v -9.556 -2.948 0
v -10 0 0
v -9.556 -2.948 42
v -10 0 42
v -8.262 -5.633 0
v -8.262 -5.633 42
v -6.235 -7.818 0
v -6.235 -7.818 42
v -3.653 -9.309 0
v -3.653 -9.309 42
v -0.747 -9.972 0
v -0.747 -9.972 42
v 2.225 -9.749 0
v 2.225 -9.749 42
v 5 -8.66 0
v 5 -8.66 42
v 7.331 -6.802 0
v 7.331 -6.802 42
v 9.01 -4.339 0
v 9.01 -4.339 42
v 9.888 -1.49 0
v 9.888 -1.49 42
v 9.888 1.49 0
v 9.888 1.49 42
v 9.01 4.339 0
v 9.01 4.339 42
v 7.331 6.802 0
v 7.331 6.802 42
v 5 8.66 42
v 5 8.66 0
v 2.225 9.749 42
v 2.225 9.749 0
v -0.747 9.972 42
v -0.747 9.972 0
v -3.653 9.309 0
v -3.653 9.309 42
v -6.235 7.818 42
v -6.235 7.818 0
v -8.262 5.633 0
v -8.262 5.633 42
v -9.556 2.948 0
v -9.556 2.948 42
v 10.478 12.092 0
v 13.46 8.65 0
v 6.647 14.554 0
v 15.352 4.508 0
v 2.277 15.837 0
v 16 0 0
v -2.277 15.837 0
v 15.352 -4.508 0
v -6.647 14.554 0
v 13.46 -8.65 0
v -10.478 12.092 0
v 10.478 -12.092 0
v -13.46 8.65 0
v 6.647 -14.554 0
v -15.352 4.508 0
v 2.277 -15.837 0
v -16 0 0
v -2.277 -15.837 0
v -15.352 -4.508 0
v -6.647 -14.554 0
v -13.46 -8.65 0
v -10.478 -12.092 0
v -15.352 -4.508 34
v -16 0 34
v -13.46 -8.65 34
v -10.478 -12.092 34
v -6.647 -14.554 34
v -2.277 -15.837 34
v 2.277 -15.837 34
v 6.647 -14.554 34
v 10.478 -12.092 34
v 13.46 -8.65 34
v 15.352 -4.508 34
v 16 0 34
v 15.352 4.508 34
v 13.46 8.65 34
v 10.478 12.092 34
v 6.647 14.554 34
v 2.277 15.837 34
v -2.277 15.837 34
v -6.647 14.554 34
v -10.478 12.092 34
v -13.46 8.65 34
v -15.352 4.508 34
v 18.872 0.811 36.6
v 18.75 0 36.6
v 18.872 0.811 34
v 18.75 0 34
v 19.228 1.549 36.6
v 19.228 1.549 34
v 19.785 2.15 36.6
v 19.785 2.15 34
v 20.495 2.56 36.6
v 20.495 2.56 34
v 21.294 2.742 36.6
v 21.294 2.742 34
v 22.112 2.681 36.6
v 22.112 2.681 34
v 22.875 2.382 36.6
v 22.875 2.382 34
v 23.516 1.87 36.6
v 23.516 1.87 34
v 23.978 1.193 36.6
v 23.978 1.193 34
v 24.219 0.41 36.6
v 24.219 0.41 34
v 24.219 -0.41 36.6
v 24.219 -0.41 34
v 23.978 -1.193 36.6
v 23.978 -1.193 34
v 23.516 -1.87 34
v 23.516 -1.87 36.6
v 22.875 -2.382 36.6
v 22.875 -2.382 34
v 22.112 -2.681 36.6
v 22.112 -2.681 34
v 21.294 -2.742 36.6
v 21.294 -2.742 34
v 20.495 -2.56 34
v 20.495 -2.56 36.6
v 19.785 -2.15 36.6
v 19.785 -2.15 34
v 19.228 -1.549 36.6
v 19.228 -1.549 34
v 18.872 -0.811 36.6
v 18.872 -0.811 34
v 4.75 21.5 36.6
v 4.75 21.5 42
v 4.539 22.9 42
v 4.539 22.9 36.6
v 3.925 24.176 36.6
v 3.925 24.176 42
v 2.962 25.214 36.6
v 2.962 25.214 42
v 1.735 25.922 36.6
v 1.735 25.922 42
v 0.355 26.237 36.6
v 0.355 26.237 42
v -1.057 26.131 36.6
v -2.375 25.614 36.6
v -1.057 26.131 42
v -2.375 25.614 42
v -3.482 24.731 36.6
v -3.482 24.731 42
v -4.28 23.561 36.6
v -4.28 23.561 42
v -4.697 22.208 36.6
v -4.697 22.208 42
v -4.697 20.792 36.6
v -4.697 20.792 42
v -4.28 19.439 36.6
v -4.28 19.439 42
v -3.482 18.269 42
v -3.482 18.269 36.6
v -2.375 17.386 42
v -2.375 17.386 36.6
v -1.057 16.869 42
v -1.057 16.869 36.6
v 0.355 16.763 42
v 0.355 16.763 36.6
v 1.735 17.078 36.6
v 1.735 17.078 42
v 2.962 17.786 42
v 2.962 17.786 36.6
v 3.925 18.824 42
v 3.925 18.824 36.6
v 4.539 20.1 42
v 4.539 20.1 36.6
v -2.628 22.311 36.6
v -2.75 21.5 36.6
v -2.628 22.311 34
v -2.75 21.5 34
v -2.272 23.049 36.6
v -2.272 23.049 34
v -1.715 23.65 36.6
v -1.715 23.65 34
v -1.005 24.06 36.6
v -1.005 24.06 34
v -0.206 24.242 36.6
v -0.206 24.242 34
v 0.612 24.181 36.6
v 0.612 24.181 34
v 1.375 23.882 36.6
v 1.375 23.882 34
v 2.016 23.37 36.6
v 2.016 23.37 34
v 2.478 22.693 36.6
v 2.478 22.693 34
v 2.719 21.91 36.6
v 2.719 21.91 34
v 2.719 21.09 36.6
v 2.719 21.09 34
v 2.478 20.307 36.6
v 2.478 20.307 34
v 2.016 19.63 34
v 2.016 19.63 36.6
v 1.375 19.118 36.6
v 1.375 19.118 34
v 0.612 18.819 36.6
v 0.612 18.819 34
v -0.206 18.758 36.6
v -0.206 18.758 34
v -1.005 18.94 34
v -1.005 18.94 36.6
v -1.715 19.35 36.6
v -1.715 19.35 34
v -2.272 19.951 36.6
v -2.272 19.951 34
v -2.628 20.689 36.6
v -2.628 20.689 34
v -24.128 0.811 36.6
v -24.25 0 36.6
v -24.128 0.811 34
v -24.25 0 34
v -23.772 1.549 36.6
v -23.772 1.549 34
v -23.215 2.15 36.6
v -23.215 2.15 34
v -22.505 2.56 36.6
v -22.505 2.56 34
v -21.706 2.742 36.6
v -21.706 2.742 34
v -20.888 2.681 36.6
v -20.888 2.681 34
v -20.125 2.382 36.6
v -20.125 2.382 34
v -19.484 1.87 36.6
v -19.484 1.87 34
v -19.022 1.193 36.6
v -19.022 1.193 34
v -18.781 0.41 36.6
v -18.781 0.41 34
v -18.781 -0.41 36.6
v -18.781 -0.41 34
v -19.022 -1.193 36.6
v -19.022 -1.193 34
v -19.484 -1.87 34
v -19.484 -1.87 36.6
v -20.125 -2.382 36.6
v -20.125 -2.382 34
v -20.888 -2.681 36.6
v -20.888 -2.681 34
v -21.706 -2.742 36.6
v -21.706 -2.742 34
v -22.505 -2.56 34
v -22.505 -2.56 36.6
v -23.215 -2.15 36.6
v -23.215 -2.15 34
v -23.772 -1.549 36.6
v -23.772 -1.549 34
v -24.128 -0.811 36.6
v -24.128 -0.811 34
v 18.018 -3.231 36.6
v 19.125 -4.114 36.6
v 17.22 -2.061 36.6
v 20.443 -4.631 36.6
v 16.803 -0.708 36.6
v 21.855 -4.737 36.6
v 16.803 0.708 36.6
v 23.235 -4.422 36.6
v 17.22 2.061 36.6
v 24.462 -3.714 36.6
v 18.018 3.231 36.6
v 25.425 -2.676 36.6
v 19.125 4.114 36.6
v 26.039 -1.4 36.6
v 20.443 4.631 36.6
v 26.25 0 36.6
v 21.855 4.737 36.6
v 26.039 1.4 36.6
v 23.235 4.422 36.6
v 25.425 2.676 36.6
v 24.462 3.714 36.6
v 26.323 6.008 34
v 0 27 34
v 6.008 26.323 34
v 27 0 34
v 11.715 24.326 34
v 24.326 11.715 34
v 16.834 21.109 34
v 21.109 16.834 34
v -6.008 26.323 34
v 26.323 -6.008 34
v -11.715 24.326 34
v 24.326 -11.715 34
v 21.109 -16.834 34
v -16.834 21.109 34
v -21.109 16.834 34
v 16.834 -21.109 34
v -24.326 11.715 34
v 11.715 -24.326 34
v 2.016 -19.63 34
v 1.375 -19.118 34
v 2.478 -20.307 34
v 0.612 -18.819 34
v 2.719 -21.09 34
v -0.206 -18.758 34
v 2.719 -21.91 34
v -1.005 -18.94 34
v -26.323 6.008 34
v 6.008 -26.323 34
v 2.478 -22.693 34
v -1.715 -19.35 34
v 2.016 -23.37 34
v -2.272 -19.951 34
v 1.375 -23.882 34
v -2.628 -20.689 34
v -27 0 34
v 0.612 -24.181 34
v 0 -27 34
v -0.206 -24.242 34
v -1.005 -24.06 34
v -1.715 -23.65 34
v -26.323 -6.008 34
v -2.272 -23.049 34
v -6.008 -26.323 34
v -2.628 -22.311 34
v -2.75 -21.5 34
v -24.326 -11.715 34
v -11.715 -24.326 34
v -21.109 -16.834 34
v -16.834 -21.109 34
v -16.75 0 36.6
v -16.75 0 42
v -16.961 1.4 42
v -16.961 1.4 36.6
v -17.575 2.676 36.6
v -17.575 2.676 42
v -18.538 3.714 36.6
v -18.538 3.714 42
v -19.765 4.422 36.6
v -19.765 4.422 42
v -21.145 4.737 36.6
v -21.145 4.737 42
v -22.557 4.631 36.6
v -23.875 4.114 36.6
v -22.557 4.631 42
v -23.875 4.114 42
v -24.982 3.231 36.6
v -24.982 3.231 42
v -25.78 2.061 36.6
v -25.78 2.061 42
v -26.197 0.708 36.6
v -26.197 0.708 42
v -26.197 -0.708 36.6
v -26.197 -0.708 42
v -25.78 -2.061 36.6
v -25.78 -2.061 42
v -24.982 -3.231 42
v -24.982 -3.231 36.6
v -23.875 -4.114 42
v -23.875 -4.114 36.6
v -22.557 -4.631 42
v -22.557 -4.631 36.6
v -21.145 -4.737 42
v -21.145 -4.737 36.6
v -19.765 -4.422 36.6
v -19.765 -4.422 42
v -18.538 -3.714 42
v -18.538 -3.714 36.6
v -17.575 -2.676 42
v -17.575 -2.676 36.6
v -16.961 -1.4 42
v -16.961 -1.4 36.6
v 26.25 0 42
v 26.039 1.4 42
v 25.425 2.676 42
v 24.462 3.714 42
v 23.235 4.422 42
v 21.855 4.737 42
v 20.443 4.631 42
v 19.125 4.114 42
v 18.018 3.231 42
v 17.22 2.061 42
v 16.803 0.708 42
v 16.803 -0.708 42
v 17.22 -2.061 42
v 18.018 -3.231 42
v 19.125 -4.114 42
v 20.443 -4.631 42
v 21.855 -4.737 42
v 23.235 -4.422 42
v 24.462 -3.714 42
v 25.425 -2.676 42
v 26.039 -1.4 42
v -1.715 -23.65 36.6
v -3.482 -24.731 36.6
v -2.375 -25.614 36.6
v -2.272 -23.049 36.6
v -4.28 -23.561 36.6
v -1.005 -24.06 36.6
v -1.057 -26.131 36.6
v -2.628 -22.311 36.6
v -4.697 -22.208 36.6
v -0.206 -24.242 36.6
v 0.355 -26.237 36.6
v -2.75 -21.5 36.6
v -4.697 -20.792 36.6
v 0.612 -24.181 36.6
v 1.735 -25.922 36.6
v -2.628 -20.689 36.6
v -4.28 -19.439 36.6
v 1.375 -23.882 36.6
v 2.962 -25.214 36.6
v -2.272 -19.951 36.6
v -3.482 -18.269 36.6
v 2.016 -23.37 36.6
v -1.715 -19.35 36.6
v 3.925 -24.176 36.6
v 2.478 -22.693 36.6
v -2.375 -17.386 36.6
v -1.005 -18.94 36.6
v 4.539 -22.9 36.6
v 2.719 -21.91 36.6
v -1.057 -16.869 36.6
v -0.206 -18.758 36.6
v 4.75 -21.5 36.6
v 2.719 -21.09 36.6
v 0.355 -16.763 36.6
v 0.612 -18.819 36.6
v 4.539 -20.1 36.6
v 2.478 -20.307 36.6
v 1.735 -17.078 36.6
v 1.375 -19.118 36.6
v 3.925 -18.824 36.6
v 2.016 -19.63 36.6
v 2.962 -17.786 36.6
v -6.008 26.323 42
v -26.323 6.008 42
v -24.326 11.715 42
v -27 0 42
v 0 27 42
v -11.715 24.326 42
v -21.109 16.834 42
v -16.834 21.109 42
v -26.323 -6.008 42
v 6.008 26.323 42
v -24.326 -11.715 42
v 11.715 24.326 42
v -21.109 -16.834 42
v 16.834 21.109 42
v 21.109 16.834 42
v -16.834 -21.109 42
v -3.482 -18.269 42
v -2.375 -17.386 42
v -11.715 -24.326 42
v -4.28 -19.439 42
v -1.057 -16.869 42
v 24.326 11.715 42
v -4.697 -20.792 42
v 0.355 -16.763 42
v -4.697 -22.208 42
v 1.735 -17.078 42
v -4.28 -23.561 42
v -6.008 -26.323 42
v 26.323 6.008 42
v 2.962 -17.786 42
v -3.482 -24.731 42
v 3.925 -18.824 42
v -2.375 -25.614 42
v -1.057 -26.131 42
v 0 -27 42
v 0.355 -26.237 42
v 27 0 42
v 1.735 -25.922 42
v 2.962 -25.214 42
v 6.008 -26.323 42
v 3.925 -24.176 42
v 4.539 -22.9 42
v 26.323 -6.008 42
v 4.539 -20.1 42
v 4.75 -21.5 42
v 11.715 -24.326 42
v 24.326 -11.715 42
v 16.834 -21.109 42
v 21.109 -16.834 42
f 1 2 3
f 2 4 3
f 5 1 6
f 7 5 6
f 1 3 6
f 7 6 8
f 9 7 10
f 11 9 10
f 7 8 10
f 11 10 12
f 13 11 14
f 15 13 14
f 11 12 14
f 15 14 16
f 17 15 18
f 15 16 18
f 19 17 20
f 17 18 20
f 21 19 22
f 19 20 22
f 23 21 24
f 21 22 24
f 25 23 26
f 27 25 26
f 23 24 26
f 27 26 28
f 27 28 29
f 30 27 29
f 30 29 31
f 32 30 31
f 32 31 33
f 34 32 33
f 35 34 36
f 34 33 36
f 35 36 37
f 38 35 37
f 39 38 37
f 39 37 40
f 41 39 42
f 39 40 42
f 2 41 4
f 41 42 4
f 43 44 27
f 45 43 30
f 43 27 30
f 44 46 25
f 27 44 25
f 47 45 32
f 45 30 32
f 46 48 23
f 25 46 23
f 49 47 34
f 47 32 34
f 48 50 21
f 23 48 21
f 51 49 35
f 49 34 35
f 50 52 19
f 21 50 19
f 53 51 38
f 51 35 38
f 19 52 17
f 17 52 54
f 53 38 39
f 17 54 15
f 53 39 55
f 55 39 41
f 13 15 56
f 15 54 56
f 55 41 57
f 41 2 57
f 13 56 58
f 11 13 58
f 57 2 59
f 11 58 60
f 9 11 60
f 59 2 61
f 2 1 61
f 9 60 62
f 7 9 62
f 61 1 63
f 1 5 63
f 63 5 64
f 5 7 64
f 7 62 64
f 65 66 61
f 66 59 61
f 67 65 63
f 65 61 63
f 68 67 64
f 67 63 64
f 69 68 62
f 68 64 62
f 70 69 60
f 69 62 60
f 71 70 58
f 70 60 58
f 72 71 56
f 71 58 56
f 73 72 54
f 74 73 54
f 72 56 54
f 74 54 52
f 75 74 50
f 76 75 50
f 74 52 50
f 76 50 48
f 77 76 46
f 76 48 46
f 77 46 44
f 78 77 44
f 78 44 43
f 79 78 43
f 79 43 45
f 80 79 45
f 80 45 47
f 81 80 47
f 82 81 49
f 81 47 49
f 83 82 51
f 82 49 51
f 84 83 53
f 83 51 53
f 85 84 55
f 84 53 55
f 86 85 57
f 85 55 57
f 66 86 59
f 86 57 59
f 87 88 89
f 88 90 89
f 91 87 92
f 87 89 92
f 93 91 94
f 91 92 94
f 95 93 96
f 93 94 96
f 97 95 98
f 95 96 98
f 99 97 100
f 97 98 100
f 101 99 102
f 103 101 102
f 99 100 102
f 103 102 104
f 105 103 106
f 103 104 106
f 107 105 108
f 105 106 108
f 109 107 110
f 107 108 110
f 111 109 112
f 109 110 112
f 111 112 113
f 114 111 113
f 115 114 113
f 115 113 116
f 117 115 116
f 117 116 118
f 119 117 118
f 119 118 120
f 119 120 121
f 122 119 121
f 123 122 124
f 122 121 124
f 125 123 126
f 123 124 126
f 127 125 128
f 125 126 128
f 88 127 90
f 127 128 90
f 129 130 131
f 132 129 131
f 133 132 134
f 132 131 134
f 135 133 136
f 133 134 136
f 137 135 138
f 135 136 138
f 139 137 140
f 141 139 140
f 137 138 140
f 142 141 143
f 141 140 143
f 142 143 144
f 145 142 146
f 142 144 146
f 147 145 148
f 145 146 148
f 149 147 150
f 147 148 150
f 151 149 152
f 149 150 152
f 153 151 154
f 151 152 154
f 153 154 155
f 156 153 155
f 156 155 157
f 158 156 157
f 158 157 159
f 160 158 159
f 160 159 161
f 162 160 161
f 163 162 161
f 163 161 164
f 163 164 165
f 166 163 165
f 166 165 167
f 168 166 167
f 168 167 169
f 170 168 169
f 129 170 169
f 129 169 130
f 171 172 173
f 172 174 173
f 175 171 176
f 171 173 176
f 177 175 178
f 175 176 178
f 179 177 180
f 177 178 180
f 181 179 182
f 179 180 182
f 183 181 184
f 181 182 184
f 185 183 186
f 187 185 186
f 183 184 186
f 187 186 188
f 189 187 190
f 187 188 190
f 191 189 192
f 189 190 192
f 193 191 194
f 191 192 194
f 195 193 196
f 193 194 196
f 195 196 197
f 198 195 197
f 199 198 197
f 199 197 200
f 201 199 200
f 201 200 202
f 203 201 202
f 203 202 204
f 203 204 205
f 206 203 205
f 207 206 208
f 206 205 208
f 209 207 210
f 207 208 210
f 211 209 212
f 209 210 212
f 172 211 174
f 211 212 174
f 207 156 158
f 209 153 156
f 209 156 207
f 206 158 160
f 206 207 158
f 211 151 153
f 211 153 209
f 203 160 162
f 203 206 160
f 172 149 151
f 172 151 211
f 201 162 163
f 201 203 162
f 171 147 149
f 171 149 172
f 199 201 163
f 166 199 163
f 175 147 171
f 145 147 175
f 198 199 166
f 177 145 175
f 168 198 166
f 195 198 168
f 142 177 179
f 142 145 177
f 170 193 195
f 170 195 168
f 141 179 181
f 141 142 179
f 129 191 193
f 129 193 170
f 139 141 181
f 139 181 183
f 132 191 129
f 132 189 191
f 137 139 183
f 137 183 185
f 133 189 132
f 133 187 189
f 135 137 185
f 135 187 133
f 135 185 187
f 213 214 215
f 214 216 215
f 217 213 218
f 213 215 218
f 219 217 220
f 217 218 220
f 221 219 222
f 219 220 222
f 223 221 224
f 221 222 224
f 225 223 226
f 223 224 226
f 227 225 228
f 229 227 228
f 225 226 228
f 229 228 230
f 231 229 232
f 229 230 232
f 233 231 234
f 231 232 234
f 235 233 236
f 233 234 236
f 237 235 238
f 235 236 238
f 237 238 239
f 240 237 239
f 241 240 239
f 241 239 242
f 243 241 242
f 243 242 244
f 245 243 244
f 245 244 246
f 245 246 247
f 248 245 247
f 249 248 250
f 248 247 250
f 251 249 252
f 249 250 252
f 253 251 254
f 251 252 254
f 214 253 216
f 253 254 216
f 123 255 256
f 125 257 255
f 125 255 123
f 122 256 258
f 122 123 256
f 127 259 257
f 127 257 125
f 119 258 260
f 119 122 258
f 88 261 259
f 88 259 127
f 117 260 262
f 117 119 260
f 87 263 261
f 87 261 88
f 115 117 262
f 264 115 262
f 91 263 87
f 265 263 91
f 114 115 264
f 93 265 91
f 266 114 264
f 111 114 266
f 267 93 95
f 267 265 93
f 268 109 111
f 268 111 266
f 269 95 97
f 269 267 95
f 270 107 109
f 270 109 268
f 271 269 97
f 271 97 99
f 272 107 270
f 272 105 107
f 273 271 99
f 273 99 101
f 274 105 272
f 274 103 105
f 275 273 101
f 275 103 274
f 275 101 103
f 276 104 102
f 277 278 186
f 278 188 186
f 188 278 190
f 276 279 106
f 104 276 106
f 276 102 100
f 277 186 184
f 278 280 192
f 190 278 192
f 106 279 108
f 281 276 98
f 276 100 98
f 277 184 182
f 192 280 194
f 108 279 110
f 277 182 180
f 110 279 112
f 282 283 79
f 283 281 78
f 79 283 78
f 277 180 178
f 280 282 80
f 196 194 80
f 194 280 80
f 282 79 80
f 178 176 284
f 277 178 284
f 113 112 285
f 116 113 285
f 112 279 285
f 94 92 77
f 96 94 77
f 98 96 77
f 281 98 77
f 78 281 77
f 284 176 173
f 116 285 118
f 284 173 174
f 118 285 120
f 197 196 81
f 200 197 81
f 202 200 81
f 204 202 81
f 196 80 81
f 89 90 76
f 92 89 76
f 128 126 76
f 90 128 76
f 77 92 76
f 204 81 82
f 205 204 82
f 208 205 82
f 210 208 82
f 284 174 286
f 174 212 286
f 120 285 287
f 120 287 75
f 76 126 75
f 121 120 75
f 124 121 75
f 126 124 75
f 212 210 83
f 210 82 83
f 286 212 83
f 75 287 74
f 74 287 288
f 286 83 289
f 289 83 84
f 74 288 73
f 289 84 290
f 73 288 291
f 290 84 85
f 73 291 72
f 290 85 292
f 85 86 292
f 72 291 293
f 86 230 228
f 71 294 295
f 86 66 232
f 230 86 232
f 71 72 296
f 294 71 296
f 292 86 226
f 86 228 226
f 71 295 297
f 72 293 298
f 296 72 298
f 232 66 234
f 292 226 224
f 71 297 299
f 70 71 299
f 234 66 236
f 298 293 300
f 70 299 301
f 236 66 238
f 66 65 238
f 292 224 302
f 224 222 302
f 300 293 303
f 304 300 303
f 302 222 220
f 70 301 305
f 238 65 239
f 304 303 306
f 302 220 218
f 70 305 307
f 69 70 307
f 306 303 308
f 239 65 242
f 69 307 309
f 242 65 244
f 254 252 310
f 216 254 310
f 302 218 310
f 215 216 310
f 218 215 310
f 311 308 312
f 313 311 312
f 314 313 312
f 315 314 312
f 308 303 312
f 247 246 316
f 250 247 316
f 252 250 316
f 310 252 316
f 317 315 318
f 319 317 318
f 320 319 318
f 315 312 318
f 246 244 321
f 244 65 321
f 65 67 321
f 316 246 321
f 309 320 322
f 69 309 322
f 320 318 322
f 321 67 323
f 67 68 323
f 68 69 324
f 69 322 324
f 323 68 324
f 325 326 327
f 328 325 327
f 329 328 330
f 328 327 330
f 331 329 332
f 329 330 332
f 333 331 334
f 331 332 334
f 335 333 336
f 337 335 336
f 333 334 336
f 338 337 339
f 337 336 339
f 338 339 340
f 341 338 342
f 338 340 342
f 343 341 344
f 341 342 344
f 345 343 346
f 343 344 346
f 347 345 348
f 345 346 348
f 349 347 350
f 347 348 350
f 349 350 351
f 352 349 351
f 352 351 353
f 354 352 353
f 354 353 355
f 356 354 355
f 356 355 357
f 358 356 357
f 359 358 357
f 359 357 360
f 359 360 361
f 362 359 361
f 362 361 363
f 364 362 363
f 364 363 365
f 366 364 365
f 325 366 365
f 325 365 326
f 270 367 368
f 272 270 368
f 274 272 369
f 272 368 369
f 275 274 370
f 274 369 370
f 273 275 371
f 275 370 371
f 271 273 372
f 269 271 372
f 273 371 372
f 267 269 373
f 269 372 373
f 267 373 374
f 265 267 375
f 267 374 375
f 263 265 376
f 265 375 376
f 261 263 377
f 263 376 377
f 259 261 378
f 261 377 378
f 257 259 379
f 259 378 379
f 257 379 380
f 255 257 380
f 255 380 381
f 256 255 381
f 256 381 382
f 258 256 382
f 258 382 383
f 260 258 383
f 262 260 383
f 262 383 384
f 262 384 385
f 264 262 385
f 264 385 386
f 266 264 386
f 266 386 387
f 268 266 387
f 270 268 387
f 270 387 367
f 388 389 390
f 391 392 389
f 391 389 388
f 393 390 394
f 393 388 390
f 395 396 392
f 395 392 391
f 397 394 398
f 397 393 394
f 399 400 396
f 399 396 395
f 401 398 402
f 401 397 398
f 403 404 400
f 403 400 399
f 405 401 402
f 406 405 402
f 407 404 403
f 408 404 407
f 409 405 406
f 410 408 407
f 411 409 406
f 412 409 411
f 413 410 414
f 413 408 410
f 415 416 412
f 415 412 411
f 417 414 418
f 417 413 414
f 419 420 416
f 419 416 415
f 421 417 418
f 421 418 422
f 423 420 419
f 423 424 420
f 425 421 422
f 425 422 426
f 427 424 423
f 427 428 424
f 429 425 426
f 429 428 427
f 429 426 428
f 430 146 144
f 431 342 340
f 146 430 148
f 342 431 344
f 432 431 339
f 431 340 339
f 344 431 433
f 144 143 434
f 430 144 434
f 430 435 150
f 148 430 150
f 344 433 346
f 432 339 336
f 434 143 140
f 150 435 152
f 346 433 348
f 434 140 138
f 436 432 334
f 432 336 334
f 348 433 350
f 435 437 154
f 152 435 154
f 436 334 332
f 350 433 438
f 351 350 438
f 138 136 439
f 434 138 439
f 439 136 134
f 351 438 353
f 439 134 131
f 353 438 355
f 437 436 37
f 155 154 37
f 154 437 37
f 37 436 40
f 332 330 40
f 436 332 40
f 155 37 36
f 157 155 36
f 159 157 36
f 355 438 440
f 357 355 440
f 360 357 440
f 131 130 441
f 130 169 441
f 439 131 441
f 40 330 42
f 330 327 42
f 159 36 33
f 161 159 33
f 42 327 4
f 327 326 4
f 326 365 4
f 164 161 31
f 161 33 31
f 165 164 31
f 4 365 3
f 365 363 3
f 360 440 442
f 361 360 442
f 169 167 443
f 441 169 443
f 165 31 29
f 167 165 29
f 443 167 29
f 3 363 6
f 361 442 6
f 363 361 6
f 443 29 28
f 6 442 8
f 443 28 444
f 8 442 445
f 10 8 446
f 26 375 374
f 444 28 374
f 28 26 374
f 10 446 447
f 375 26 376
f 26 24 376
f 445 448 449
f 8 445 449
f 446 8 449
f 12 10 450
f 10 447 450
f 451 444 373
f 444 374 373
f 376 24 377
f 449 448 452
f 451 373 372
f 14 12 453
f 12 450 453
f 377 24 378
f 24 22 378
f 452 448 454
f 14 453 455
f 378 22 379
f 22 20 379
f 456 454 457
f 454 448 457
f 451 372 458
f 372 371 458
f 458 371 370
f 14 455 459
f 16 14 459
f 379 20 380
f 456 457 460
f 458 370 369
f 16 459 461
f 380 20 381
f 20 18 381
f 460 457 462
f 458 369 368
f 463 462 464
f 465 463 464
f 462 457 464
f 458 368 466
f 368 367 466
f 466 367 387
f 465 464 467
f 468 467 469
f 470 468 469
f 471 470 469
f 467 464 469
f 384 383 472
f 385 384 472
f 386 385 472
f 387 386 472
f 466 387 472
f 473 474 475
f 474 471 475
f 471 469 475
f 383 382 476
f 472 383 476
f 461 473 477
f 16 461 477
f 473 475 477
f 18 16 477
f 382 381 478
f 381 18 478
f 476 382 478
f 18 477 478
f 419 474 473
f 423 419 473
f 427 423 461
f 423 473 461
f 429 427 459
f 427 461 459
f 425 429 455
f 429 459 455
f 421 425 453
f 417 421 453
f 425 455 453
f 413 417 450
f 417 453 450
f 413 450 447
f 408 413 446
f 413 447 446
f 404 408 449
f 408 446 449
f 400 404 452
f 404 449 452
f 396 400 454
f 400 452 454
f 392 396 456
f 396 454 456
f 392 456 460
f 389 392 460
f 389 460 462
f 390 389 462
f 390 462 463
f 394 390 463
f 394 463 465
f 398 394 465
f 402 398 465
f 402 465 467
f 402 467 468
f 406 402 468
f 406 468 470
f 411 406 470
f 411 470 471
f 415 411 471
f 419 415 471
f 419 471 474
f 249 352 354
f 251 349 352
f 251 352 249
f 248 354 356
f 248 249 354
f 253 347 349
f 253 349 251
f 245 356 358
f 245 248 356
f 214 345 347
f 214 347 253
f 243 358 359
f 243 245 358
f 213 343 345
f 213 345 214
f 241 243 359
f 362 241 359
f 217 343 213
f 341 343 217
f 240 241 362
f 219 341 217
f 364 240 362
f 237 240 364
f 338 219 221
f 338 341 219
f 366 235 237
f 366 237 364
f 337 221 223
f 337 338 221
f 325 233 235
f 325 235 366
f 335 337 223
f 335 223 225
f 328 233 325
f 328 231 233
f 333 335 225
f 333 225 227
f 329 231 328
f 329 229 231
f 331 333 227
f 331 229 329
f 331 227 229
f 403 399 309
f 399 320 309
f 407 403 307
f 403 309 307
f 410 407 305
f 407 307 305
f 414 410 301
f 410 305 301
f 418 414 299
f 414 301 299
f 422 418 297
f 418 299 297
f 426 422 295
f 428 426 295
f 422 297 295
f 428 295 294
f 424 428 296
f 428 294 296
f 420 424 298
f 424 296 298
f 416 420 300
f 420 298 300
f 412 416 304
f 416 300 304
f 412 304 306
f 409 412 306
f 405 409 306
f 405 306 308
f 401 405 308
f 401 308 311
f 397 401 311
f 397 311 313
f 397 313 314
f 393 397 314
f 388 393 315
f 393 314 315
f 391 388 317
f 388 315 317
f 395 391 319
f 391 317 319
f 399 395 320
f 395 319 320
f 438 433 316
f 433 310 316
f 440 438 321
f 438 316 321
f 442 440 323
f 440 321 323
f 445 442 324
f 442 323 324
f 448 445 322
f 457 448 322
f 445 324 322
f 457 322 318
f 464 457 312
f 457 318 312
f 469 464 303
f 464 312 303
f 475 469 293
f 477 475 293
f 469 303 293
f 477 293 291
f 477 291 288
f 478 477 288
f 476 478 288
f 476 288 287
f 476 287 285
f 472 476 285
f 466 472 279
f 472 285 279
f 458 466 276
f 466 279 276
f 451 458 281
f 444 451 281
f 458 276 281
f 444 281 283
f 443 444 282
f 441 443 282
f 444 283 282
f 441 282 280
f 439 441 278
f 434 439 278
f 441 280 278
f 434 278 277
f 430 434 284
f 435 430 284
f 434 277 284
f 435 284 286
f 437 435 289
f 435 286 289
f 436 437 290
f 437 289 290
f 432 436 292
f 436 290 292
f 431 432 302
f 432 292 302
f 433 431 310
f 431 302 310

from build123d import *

# Parameters (mm, degrees)
HOLE_WIZARD_1_D           = 5.5
HOLE_WIZARD_1_CBORE_D     = 9.5
HOLE_WIZARD_1_CBORE_DEPTH = 5.4


with BuildPart() as part:
    # 草图1 → 旋转1 (revolve)
    with BuildSketch(Plane(origin=(0, 0, 0), x_dir=(0, 0, 1), z_dir=(0, -1, 0))):
        Polygon((0, 10), (42, 10), (42, 27), (34, 27), (34, 16), (0, 16), align=None)
    revolve(axis=Axis((0, 0, 0), (0, 0, 1)))

    # 孔1 (through all)
    with Locations(Plane.XY.offset(42)):
        with Locations((0, -21.5), (-21.5, 0), (0, 21.5), (21.5, 0)):
            CounterBoreHole(HOLE_WIZARD_1_D / 2, HOLE_WIZARD_1_CBORE_D / 2, HOLE_WIZARD_1_CBORE_DEPTH)


solid = part.part
